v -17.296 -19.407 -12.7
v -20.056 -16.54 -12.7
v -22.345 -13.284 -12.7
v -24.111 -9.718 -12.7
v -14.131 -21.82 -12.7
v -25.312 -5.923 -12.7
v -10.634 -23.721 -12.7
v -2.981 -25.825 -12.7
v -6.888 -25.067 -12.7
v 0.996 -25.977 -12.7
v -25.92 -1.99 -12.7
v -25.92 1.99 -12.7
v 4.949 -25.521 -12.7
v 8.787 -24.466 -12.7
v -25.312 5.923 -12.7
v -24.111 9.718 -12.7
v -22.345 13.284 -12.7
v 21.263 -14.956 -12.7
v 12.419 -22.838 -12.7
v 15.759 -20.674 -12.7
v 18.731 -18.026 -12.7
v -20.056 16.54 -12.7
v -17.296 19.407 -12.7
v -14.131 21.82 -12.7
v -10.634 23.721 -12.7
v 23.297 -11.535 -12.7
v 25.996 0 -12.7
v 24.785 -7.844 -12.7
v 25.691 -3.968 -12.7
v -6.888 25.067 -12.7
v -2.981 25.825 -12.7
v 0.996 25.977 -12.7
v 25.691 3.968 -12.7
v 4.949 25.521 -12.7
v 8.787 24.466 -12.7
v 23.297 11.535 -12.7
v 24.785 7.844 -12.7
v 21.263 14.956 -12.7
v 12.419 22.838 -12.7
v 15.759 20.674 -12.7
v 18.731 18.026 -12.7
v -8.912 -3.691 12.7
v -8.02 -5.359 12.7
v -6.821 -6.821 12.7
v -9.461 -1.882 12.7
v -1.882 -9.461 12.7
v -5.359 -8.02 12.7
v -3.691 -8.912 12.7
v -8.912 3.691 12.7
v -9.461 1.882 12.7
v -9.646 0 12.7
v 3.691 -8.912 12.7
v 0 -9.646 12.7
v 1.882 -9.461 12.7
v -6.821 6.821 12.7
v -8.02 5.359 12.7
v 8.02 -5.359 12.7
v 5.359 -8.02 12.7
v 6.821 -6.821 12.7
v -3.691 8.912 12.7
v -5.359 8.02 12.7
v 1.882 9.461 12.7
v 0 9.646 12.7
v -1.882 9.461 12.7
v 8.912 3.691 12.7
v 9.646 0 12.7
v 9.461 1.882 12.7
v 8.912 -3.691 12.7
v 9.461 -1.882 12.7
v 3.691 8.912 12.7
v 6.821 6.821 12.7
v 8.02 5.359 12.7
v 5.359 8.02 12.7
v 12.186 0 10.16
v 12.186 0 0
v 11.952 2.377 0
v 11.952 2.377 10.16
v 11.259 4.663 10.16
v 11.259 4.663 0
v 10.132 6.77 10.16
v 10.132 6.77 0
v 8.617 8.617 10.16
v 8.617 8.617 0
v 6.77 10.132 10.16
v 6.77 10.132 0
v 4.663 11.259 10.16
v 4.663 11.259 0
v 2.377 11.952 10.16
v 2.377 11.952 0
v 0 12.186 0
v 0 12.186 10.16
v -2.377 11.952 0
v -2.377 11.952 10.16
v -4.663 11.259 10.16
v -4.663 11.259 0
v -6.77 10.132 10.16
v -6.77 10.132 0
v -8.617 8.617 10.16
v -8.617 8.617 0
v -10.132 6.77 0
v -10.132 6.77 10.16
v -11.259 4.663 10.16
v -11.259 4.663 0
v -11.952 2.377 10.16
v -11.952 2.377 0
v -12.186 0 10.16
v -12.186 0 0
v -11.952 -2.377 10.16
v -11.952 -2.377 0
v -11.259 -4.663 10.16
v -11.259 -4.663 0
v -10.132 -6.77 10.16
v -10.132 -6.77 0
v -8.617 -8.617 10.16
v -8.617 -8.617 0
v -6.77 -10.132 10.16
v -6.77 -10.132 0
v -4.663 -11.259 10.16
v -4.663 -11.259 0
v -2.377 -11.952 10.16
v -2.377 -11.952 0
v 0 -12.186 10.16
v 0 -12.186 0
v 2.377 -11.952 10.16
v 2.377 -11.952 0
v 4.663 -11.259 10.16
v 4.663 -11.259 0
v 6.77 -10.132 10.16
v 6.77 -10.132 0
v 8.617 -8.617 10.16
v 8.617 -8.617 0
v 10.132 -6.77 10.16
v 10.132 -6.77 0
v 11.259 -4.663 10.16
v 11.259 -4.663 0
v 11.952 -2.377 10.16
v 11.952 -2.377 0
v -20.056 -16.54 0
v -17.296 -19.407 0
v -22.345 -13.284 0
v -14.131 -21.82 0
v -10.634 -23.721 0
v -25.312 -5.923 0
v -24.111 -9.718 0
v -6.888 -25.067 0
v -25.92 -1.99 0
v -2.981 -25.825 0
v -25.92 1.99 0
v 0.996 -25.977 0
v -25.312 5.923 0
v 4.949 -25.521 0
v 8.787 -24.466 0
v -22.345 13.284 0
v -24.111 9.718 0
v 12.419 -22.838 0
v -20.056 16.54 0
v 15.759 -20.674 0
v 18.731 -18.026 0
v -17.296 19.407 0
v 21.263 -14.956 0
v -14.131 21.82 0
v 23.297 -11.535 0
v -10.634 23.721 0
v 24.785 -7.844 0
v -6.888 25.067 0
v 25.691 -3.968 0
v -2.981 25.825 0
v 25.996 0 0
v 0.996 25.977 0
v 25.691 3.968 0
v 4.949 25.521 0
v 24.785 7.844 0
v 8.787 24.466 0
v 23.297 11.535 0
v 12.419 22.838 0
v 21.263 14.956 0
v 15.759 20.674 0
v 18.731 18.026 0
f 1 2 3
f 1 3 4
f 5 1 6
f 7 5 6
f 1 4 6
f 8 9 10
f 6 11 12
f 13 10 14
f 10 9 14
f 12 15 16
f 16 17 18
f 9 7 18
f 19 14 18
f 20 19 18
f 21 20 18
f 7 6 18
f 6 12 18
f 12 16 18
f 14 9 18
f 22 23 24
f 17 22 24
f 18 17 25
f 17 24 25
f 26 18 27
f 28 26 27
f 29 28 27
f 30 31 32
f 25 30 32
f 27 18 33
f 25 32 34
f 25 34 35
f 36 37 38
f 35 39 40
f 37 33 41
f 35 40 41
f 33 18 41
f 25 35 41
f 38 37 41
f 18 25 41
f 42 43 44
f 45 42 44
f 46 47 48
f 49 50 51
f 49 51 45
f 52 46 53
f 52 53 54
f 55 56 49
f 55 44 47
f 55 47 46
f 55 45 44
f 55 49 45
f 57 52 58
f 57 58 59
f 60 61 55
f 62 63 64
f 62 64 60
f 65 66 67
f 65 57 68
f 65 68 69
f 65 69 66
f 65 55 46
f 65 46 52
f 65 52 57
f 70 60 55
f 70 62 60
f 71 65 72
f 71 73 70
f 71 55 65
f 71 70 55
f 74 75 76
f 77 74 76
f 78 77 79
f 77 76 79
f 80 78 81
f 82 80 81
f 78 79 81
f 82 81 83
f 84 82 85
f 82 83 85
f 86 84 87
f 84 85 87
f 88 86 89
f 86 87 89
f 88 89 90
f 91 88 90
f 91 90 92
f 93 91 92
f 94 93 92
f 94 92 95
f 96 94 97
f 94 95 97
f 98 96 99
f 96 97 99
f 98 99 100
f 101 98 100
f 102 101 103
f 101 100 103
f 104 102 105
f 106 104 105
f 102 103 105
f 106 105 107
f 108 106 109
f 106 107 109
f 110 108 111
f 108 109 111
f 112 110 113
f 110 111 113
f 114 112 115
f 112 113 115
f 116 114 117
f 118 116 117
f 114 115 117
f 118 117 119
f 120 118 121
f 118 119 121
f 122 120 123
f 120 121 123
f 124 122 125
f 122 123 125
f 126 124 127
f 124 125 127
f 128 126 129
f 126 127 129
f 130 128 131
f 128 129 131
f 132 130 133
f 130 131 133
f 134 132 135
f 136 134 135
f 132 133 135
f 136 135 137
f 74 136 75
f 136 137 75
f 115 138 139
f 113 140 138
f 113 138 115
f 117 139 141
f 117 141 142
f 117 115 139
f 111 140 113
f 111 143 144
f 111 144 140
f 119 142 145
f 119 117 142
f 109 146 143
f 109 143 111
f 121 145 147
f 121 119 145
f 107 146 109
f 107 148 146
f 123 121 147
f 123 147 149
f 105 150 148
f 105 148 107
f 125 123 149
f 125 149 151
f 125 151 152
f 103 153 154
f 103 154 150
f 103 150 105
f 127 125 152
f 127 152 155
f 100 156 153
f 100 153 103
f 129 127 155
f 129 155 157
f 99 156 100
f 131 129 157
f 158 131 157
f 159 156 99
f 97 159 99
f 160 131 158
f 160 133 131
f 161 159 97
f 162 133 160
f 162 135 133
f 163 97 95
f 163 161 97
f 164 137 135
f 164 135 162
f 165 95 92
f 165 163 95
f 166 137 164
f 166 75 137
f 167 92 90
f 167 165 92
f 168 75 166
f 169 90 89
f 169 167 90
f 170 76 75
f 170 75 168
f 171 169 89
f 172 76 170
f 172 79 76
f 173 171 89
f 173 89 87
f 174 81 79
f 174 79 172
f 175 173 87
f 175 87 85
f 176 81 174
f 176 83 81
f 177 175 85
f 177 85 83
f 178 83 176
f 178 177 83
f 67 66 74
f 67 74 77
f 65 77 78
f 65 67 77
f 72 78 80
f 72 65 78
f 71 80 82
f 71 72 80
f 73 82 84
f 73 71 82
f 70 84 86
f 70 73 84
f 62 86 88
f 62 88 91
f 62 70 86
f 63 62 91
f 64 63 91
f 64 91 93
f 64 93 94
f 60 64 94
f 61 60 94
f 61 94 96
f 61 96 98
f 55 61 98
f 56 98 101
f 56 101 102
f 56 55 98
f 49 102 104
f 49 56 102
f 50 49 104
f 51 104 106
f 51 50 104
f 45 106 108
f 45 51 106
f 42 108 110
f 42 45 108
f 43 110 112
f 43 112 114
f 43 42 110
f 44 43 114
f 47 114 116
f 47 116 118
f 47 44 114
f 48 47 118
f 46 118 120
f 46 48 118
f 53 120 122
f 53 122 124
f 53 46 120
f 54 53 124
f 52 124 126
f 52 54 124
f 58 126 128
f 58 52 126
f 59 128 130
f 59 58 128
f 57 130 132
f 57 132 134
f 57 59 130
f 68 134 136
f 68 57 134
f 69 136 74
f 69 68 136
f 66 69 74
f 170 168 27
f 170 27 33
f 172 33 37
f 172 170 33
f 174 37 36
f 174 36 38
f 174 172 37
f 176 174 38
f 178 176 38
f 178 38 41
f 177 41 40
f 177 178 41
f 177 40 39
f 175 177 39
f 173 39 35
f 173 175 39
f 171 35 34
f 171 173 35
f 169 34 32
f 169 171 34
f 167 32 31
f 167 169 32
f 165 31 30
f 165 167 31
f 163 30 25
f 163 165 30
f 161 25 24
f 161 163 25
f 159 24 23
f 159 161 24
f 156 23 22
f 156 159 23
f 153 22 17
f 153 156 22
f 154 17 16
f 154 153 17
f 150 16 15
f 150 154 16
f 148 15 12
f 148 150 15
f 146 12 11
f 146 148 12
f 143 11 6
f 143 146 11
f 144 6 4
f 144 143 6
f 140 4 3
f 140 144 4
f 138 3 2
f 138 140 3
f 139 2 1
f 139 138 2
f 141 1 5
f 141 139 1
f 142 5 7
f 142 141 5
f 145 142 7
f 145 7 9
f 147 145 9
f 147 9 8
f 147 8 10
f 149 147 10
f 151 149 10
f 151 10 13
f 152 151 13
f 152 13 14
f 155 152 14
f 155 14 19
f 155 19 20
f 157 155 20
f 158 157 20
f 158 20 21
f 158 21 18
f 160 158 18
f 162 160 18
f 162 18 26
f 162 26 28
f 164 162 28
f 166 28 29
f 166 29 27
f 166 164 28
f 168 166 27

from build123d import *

# Parameters (mm, degrees)
F0_R     = 25.996027
F1_DEPTH = 12.7
F2_R     = 12.186121
F3_DEPTH = 12.7
F4_SIZE  = 2.54


with BuildPart() as f1:
    # F0 (on Top) → F1 (new body)
    with BuildSketch(Plane.XY):
        Circle(F0_R)
    extrude(amount=-F1_DEPTH)

    # F2 (on face) → F3 (join)
    with BuildSketch(Plane.XY):
        Circle(F2_R)
    extrude(amount=F3_DEPTH)

    # F4
    f4_edges = [f1.edges().sort_by_distance(p)[0] for p in [
        (-12.186121, 0, 12.7),
    ]]
    chamfer(f4_edges, length=F4_SIZE)


solid = f1.part
